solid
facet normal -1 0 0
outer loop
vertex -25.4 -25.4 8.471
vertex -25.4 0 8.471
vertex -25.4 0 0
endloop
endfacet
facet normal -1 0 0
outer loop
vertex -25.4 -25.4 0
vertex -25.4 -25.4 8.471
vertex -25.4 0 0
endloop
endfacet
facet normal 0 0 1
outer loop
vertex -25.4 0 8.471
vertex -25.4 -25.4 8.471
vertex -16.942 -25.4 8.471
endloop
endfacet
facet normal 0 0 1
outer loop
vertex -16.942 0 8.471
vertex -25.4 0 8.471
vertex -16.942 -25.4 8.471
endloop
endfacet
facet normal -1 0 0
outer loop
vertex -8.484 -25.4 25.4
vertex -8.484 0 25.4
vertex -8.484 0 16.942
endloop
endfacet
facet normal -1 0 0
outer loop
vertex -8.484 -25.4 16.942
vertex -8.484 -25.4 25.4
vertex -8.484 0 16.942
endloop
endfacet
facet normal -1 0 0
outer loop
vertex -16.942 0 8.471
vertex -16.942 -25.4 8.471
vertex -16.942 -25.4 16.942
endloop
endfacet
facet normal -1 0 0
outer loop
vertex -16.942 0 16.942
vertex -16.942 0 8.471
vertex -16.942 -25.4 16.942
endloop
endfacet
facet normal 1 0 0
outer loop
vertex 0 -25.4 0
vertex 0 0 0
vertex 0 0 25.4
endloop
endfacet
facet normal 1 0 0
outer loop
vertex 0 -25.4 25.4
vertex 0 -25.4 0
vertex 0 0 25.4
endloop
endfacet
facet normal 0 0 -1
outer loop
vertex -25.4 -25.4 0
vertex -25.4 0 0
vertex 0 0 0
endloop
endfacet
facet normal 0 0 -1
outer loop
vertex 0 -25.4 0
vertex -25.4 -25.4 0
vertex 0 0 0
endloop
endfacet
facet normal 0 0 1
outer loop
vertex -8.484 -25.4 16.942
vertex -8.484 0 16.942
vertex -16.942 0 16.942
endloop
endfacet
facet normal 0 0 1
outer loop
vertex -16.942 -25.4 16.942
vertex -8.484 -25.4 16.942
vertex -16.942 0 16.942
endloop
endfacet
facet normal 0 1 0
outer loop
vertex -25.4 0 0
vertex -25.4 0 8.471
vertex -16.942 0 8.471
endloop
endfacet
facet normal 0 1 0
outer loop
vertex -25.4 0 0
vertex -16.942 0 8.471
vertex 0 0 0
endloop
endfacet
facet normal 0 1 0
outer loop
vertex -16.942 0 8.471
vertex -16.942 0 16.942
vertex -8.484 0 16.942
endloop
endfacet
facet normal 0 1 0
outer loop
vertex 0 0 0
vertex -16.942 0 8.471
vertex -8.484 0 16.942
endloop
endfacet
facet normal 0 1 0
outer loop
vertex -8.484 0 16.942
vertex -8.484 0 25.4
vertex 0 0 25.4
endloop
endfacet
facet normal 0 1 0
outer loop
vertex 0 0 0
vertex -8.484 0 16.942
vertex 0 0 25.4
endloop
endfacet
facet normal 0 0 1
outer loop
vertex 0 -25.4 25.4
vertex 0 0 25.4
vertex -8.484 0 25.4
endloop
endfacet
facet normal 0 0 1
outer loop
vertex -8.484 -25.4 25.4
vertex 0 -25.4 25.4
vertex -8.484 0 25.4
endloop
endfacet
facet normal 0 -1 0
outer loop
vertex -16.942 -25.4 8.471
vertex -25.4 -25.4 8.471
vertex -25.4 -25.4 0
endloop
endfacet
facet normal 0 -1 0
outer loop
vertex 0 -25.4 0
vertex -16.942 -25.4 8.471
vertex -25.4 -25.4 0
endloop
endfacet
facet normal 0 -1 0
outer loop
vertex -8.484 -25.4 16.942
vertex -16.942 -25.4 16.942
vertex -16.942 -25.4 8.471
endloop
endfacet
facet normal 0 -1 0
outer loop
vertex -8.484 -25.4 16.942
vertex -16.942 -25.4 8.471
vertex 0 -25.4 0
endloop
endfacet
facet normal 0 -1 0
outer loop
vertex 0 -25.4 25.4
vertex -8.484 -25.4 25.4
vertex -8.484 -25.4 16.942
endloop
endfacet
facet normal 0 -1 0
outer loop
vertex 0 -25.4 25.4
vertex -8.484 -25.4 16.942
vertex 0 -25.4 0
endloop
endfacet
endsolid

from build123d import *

# Parameters (mm, degrees)
F1_DEPTH = 25.4
F2_W     = 8.4582
F2_H     = 8.4709
F3_DEPTH = 25.4


with BuildPart() as f1:
    # F0 (on Front) → F1 (new body)
    with BuildSketch(Plane.XZ):
        Polygon((-25.4, 0), (0, 0), (0, 25.4), (-8.4836, 25.4), (-8.4836, 16.9418), (-25.4, 16.9418), align=None)
    extrude(amount=F1_DEPTH)

    # F2 (on face) → F3 (cut)
    with BuildSketch(Plane.XZ.offset(25.4)):
        with Locations((-21.1709, 12.70635)):
            Rectangle(F2_W, F2_H)
    extrude(amount=-F3_DEPTH, mode=Mode.SUBTRACT)


solid = f1.part
